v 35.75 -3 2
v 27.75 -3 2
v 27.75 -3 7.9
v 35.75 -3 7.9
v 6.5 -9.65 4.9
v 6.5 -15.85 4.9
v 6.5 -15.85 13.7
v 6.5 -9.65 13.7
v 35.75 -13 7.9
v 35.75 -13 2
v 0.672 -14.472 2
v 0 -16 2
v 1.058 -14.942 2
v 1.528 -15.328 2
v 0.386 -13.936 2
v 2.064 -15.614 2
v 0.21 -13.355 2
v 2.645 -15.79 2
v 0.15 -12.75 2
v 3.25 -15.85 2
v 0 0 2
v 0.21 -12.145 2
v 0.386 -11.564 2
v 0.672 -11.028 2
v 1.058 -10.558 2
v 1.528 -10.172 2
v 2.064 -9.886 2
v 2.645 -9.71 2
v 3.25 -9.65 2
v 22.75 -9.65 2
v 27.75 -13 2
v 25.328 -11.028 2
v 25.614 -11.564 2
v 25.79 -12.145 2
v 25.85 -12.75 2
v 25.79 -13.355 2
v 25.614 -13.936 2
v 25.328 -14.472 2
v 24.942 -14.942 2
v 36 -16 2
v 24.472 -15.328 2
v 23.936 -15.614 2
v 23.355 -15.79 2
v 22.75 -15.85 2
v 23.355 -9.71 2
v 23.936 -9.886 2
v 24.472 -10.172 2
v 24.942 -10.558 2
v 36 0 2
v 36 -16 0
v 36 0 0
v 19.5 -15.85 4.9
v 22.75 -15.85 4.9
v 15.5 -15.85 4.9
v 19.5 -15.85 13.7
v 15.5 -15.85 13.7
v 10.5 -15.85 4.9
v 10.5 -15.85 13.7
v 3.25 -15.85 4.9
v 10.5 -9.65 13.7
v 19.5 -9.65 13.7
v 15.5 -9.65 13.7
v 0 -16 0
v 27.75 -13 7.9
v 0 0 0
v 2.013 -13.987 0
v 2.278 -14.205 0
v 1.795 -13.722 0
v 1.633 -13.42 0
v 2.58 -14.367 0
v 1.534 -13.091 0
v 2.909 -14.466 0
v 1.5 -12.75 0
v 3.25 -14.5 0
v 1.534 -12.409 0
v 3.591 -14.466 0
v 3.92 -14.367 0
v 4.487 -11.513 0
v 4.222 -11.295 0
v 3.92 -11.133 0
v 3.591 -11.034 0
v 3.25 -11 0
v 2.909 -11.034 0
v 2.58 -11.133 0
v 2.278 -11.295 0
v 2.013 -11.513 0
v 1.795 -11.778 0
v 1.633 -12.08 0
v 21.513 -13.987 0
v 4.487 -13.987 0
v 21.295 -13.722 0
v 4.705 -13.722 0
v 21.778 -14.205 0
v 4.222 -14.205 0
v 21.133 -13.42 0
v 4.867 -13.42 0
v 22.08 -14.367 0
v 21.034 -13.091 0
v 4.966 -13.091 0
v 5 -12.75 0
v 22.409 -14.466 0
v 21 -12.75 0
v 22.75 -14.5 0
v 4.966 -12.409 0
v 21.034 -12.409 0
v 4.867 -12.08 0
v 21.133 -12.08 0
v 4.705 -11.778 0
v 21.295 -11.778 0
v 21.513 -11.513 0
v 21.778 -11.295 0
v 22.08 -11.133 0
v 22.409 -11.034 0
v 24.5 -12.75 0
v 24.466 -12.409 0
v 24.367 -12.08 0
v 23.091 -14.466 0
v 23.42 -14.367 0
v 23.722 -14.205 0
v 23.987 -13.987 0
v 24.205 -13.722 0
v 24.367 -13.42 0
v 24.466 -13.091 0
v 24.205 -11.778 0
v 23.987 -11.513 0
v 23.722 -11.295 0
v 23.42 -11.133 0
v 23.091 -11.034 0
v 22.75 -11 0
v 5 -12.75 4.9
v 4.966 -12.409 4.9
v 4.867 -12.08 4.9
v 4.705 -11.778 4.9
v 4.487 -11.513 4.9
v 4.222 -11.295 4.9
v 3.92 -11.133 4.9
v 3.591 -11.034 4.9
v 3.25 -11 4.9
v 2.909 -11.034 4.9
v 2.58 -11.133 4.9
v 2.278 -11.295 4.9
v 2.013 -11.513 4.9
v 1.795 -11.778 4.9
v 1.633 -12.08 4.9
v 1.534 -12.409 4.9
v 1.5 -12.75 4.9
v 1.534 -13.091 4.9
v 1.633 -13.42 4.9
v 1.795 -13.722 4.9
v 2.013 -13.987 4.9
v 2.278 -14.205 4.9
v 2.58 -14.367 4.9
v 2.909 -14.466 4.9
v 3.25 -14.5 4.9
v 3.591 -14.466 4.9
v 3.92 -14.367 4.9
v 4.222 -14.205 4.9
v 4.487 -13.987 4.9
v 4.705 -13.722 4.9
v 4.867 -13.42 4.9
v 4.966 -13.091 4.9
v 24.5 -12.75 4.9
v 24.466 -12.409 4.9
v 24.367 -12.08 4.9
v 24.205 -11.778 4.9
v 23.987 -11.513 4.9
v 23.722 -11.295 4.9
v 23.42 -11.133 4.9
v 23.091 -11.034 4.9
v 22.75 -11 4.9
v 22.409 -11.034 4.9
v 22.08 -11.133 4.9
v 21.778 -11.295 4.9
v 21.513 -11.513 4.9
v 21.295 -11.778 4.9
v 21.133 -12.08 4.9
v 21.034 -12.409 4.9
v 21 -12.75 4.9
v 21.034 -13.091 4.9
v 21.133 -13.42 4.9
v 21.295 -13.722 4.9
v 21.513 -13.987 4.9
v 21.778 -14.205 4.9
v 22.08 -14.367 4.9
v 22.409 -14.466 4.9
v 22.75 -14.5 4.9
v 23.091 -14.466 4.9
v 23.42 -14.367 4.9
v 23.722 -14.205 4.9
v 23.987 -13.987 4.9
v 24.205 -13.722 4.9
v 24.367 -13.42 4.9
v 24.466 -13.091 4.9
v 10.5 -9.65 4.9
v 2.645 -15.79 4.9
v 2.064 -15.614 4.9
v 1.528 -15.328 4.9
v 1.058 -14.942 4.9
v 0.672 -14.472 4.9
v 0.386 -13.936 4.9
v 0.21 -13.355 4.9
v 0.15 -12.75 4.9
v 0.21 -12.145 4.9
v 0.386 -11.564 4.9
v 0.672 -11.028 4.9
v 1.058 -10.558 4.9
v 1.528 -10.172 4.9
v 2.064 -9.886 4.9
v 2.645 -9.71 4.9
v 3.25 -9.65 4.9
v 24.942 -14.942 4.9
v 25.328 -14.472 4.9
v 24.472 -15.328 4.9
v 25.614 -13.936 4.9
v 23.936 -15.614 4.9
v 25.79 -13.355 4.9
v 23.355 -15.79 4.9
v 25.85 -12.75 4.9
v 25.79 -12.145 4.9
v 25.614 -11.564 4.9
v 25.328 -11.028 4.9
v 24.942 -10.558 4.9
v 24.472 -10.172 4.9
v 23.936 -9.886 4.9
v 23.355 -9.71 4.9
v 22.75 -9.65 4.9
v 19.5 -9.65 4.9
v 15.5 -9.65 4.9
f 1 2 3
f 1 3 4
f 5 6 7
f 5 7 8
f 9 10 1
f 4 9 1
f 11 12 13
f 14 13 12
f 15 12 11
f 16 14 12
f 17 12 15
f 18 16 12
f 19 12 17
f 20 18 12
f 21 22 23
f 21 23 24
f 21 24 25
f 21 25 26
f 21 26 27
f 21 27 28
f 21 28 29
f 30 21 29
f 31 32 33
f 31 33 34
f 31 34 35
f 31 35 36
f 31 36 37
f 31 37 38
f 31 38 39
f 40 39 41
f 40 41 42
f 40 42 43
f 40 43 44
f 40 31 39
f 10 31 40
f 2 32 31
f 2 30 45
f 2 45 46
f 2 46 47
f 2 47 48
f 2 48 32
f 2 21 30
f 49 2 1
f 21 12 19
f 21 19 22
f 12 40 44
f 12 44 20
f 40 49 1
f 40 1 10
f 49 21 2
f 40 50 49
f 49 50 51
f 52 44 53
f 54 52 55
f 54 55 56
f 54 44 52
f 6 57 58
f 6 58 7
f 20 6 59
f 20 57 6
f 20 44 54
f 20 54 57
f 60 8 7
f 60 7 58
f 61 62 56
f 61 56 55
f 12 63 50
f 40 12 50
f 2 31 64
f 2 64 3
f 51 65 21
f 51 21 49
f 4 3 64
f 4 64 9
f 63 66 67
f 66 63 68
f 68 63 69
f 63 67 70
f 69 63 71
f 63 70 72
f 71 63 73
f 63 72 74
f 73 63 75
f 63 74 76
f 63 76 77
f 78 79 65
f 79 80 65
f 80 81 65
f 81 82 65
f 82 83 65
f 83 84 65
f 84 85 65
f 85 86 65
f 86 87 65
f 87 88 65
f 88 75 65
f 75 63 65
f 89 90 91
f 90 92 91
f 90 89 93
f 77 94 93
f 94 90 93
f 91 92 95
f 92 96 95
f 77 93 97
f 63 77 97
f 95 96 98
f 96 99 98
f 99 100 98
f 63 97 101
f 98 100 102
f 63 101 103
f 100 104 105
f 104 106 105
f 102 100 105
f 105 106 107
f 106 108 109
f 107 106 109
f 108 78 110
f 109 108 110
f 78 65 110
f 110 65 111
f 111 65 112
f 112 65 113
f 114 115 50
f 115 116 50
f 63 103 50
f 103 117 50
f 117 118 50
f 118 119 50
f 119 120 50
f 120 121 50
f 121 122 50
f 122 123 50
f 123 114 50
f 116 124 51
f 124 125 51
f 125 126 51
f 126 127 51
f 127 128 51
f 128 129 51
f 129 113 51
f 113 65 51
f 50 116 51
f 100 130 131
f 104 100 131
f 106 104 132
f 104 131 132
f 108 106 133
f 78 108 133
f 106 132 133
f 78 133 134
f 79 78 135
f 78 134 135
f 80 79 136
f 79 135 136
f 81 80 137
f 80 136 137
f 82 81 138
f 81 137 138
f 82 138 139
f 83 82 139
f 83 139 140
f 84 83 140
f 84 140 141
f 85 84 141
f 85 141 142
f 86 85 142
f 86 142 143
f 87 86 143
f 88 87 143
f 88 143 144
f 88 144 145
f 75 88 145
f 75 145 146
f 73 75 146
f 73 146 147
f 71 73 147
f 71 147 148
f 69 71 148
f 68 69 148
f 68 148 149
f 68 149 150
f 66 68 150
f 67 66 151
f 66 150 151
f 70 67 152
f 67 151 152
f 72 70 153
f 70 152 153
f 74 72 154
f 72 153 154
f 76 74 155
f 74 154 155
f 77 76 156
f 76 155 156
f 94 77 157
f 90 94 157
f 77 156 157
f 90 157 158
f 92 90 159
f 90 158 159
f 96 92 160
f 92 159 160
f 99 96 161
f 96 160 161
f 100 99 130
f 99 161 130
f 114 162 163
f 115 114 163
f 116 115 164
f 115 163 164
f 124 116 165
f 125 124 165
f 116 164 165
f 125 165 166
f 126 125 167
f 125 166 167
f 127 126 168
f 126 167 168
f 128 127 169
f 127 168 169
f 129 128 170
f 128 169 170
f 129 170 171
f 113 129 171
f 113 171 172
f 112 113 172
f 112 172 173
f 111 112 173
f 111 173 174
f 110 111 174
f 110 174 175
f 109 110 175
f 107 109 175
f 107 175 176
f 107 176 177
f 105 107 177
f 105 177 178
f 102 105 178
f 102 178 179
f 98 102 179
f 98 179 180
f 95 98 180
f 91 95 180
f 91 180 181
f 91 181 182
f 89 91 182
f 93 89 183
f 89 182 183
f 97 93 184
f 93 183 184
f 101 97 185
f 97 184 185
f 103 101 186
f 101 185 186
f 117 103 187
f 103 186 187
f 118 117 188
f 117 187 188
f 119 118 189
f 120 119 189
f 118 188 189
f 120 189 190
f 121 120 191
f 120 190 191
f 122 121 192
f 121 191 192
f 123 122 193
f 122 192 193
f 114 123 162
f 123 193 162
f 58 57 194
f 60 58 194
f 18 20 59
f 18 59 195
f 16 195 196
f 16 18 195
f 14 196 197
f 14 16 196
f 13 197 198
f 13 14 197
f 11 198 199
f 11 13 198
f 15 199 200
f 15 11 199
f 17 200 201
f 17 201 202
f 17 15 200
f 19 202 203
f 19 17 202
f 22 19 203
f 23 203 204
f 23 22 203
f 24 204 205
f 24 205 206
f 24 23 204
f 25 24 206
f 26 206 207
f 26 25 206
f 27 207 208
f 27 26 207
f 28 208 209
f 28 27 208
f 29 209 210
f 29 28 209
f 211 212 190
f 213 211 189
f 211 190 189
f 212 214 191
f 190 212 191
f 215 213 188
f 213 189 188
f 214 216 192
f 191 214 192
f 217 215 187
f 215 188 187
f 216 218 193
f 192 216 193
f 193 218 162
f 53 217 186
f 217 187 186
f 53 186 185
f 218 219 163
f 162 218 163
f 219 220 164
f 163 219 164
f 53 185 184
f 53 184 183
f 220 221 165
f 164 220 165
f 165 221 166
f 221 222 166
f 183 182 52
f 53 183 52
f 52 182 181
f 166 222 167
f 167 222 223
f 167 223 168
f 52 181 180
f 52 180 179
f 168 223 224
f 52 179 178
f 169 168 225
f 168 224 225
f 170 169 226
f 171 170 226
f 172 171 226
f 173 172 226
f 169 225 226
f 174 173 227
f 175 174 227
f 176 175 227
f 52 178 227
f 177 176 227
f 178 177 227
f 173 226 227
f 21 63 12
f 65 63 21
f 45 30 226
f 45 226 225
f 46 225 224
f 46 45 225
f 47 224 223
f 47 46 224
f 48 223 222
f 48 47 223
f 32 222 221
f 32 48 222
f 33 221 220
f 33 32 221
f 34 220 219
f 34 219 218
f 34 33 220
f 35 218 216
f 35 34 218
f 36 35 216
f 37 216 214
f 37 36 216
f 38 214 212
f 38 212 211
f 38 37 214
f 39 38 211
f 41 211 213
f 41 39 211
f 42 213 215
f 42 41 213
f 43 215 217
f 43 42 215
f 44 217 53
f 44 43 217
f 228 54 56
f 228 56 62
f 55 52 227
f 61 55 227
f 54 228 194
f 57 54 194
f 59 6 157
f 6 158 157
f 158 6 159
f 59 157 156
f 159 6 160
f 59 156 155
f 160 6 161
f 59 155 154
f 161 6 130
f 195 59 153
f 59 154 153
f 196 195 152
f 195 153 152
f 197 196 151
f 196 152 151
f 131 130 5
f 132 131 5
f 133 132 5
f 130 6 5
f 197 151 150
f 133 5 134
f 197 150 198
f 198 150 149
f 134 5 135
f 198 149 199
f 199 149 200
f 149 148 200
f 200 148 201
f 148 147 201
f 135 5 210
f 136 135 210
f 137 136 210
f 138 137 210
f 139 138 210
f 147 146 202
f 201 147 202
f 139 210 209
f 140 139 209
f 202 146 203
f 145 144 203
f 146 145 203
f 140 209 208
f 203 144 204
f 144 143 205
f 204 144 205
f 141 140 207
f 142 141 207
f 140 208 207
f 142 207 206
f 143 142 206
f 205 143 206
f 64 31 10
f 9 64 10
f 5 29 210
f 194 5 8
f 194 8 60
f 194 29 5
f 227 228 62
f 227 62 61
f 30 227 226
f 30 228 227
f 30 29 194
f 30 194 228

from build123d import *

# Parameters (mm, degrees)
SKETCH_1_W          = 36
SKETCH_1_H          = 16
EXTRUDE_1_DEPTH     = 2
EXTRUDE_2_DEPTH     = 2.9
SKETCH_3_W          = 4
SKETCH_3_H          = 6.2
EXTRUDE_3_DEPTH     = 8.8
SKETCH_4_W          = 8
SKETCH_4_H          = 10
EXTRUDE_4_DEPTH     = 5.9
SKETCH_5_R          = 1.75
CUT_EXTRUDE_1_DEPTH = 41.366322597


with BuildPart() as part:
    # Эскиз1 → Бобышка-Вытянуть1 (new body)
    with BuildSketch(Plane.XY):
        with Locations((18, -8)):
            Rectangle(SKETCH_1_W, SKETCH_1_H)
    extrude(amount=EXTRUDE_1_DEPTH)

    # Эскиз2 → Бобышка-Вытянуть2 (add)
    with BuildSketch(Plane.XY.offset(2)):
        with BuildLine():
            Line((3.25, -9.65), (22.75, -9.65))
            ThreePointArc((22.75, -9.65), (25.85, -12.75), (22.75, -15.85))
            Line((22.75, -15.85), (3.25, -15.85))
            ThreePointArc((3.25, -15.85), (0.15, -12.75), (3.25, -9.65))
        make_face()
    extrude(amount=EXTRUDE_2_DEPTH)

    # Эскиз3 → Бобышка-Вытянуть3 (add)
    with BuildSketch(Plane.XY.offset(4.9)):
        with Locations((8.5, -12.75)):
            Rectangle(SKETCH_3_W, SKETCH_3_H)
        with Locations((17.5, -12.75)):
            Rectangle(SKETCH_3_W, SKETCH_3_H)
    extrude(amount=EXTRUDE_3_DEPTH)

    # Эскиз4 → Бобышка-Вытянуть4 (add)
    with BuildSketch(Plane.XY.offset(2)):
        with Locations((31.75, -8)):
            Rectangle(SKETCH_4_W, SKETCH_4_H)
    extrude(amount=EXTRUDE_4_DEPTH)

    # Эскиз5 → Вырез-Вытянуть1 (cut, through all)
    with BuildSketch(Plane.XY.offset(4.9)):
        with Locations((3.25, -12.75)):
            Circle(SKETCH_5_R)
        with Locations((22.75, -12.75)):
            Circle(SKETCH_5_R)
    extrude(amount=-CUT_EXTRUDE_1_DEPTH, mode=Mode.SUBTRACT)


solid = part.part
